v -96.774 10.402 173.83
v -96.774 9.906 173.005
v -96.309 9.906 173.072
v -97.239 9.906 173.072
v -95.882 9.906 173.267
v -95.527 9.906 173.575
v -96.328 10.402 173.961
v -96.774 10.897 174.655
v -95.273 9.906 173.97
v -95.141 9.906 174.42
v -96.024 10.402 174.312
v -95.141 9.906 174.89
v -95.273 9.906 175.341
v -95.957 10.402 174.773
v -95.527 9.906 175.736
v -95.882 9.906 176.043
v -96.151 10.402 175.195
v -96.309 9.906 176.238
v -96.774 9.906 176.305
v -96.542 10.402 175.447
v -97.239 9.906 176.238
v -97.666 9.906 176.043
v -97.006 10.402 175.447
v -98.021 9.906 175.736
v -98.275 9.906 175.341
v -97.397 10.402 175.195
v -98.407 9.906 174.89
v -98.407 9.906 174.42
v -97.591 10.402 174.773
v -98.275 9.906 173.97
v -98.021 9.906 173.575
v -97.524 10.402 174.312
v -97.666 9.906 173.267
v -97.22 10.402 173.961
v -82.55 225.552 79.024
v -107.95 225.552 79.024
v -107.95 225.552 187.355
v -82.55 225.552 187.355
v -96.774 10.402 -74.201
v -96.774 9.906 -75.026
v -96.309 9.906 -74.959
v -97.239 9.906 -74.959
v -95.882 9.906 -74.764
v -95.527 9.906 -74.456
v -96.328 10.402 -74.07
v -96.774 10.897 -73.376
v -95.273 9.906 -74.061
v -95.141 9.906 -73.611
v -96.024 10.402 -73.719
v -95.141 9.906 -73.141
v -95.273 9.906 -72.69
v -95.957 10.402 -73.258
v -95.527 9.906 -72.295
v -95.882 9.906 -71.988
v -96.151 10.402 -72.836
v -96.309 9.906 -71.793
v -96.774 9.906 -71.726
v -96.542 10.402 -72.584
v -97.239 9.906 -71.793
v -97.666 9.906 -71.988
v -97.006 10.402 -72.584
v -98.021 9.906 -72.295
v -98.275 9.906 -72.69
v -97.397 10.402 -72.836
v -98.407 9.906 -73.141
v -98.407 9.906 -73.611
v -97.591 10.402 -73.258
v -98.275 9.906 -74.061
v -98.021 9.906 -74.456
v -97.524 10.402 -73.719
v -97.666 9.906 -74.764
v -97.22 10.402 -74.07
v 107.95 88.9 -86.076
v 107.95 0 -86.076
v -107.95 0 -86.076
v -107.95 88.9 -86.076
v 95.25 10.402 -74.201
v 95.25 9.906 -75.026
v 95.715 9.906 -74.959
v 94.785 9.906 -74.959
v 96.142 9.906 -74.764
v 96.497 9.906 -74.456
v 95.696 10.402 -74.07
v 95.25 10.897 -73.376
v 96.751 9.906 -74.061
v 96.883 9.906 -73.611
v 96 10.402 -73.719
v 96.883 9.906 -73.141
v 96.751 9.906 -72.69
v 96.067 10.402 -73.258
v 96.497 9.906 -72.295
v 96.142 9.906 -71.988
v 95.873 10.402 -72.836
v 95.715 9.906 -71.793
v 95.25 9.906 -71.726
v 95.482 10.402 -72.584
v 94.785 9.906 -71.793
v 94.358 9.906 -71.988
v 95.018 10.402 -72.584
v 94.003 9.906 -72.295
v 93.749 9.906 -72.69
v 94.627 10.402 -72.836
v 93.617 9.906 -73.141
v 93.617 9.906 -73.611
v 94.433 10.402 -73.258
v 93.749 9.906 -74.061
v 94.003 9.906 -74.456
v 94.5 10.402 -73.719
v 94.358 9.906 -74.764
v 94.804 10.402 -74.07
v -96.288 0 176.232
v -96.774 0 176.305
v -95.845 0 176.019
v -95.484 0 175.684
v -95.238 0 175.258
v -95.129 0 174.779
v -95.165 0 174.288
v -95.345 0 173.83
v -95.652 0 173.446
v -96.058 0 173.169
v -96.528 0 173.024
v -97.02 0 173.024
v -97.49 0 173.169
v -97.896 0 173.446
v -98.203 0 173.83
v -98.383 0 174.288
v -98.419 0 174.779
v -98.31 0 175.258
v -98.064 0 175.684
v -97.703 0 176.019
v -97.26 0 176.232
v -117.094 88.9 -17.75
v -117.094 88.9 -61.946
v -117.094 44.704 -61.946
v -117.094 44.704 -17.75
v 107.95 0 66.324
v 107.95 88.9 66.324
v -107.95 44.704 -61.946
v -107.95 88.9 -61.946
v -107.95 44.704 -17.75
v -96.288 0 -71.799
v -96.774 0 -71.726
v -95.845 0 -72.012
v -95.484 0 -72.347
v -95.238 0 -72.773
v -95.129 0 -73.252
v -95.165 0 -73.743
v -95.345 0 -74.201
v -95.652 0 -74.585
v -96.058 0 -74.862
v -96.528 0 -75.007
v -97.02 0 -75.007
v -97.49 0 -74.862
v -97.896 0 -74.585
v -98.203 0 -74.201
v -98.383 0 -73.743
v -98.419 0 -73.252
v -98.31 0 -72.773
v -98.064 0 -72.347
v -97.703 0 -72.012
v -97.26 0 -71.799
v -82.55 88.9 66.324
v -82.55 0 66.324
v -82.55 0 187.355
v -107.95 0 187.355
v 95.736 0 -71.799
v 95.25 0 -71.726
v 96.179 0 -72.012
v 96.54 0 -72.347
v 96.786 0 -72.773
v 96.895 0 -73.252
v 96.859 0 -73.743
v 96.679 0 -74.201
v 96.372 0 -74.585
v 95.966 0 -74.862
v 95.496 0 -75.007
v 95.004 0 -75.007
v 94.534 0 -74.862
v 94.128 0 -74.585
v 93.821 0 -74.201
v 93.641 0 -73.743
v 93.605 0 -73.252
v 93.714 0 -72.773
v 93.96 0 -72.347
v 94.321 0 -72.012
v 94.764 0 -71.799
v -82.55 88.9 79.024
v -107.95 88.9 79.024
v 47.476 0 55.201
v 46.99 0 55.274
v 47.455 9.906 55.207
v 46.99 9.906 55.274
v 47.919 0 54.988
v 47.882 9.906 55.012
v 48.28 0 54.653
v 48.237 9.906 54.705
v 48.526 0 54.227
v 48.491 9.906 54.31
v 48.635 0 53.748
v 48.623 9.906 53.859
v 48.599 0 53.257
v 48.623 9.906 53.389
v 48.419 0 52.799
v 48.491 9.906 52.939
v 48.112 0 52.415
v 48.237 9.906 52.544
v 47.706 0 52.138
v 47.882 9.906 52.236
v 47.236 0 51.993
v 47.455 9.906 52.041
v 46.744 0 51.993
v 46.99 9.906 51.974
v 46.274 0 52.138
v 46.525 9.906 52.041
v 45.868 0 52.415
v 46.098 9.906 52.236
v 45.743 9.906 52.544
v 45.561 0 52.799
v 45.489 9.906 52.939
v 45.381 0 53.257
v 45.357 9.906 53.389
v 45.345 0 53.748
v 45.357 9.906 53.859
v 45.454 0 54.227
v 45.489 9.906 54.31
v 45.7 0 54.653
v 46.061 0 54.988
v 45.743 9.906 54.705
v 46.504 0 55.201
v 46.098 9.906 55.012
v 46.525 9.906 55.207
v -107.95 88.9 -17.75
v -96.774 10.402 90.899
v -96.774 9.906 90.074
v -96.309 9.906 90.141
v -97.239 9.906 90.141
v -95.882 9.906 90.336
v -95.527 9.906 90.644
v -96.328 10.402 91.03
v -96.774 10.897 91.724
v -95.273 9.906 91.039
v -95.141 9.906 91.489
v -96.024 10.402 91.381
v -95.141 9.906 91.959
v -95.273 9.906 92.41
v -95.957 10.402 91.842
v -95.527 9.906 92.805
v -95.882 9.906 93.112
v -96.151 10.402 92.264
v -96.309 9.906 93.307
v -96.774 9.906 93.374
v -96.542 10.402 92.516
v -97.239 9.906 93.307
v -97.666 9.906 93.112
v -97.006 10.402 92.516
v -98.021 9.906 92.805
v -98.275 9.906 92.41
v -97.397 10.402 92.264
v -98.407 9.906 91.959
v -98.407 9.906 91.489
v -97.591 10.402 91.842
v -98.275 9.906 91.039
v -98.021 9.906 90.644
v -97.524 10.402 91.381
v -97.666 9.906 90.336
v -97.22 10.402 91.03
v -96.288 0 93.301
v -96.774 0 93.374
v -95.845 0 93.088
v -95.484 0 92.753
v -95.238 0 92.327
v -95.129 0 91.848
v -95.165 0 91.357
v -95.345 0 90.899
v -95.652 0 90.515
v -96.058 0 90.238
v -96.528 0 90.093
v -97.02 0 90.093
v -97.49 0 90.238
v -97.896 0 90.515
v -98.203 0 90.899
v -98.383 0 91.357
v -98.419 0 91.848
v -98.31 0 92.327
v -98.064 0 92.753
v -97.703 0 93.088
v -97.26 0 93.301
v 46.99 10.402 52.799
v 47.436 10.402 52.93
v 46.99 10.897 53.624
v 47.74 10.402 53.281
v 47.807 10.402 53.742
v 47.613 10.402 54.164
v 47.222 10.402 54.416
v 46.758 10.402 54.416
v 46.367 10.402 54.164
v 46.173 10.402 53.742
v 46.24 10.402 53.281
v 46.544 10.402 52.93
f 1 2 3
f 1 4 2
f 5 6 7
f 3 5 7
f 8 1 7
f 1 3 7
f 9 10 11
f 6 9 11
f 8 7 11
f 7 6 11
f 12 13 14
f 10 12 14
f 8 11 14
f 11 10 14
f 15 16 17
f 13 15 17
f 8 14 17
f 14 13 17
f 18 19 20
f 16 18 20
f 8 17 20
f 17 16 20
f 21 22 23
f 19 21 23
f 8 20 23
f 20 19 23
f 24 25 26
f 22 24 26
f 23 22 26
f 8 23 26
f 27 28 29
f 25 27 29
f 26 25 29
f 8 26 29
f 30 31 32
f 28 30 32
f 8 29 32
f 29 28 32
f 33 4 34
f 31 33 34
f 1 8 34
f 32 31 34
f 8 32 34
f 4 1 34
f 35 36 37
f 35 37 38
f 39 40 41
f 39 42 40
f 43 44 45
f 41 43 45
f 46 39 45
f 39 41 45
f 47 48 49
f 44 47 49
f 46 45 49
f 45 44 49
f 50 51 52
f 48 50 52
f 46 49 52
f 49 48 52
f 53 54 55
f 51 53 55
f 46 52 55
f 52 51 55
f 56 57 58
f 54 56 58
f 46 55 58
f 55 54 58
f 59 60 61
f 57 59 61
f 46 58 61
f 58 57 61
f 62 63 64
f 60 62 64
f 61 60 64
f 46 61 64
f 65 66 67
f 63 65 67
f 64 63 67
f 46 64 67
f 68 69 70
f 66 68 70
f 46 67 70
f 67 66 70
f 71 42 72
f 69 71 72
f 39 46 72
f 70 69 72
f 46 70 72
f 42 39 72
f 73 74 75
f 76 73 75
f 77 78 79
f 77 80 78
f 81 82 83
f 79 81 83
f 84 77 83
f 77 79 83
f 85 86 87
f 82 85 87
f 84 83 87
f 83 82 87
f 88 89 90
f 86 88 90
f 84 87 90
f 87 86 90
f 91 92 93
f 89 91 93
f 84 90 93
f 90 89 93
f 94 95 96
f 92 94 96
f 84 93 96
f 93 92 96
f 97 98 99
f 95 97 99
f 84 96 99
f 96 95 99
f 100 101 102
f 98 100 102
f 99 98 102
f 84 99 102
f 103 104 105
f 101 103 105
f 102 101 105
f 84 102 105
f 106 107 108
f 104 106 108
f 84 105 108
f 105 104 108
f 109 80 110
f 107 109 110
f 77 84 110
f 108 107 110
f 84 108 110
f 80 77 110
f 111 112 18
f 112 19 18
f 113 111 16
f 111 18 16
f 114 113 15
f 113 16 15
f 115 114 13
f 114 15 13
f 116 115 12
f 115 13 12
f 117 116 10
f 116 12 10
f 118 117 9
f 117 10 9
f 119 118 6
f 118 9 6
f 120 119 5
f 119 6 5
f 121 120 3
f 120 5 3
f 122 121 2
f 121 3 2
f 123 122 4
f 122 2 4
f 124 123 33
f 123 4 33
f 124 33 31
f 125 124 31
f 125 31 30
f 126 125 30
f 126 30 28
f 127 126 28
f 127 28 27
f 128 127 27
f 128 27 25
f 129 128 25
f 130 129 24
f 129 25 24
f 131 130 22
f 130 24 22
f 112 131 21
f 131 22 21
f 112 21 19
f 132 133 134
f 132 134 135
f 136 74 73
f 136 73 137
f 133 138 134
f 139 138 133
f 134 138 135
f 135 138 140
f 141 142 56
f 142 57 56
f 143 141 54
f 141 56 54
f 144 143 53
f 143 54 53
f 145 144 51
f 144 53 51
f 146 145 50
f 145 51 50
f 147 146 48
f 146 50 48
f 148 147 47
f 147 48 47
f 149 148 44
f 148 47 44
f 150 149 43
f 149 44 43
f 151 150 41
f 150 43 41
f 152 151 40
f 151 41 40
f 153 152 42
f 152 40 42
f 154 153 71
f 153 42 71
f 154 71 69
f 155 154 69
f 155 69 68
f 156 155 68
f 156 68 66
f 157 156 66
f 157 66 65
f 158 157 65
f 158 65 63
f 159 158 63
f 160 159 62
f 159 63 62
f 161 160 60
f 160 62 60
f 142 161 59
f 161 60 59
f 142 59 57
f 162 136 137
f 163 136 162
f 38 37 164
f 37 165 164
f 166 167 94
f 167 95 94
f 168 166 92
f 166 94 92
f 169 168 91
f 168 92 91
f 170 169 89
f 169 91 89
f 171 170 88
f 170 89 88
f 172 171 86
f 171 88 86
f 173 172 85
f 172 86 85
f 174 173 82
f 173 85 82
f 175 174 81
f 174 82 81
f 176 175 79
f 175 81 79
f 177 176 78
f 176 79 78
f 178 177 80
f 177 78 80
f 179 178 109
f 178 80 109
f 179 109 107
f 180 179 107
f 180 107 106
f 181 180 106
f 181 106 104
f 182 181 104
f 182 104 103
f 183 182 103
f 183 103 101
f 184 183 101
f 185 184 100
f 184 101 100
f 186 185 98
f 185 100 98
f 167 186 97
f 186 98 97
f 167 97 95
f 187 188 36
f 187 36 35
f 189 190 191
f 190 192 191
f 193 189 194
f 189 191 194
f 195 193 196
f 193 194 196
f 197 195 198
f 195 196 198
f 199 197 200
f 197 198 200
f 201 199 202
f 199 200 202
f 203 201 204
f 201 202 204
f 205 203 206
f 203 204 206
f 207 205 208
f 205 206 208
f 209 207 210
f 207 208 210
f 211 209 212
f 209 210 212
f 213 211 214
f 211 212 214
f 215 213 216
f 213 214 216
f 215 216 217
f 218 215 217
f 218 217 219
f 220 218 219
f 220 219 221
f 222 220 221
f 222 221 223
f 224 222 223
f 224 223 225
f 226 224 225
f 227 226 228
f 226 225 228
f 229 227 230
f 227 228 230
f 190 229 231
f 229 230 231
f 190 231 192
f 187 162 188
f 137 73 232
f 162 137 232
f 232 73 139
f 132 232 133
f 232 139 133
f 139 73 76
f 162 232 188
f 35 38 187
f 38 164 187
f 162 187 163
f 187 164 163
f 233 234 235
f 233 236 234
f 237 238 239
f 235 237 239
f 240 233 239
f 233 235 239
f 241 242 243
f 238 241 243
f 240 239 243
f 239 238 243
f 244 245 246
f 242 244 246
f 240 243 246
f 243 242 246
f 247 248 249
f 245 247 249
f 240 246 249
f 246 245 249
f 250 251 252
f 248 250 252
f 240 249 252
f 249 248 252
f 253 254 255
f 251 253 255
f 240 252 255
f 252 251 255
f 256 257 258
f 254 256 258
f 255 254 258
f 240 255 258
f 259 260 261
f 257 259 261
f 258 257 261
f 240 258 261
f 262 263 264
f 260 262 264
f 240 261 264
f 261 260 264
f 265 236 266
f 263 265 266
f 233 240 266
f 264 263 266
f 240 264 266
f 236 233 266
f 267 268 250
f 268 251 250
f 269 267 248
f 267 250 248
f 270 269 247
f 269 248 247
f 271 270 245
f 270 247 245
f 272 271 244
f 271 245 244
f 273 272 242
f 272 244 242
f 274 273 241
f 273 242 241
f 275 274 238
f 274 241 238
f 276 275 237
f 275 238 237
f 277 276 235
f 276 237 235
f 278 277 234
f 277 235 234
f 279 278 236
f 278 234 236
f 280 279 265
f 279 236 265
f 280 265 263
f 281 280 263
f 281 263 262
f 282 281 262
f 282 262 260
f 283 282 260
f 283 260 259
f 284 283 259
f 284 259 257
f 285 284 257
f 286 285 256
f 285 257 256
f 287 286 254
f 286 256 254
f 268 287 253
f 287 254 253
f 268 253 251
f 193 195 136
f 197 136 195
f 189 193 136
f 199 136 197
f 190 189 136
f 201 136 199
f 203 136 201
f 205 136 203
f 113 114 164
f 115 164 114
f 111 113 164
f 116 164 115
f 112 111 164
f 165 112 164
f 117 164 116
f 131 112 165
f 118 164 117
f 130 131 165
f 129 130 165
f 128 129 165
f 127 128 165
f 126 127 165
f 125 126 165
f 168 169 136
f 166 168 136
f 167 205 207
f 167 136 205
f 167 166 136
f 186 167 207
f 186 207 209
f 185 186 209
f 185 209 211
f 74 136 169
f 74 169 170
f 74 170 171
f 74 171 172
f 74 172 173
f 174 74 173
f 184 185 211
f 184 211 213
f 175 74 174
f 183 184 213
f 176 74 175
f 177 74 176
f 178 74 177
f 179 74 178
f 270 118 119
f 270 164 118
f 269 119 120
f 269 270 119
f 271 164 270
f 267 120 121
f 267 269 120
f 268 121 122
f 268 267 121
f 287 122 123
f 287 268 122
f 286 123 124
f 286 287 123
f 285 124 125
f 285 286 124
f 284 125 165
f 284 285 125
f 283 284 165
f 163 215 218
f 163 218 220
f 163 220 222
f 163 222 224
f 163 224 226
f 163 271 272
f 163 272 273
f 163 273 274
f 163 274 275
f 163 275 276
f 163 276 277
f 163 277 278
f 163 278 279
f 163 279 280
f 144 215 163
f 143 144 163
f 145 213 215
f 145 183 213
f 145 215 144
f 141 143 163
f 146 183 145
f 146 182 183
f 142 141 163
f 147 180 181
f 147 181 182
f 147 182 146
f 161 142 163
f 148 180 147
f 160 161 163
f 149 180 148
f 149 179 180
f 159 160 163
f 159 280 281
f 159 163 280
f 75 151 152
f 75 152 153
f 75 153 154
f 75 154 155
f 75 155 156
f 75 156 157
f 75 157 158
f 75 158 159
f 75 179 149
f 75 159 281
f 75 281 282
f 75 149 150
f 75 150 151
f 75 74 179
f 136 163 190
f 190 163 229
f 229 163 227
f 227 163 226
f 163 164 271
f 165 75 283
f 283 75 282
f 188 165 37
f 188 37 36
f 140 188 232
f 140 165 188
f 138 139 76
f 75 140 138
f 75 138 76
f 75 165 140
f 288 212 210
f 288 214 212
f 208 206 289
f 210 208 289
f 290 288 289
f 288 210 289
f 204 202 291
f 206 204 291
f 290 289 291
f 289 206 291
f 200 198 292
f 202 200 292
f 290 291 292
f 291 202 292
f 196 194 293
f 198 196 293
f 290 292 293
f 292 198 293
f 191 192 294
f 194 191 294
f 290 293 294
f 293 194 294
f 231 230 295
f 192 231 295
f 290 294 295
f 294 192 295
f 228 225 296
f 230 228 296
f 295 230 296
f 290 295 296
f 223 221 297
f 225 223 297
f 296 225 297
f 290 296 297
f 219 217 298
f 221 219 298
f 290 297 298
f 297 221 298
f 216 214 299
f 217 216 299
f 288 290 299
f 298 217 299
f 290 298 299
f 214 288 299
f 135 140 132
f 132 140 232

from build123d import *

# Parameters (mm, degrees)
BOSS_EXTRUDE2_DEPTH       = 88.9
SKETCH2_W                 = 25.4
SKETCH2_H                 = 108.331
BOSS_EXTRUDE3_DEPTH       = 136.652
M4X0_7_TAPPED_HOLE2_D     = 3.3
M4X0_7_TAPPED_HOLE2_DEPTH = 9.906
M4X0_7_TAPPED_HOLE2_TIP   = 0.991420021
SKETCH5_W                 = 44.196
SKETCH5_H                 = 44.196
BOSS_EXTRUDE4_DEPTH       = 9.144


with BuildPart() as part:
    # Sketch1 → Boss-Extrude2 (new body)
    with BuildSketch(Plane(origin=(0, 0, 0), x_dir=(1, 0, 0), z_dir=(0, 1, 0))):
        Polygon((-82.55, 86.075791262), (107.95, 86.075791262), (107.95, -66.324208738), (-82.55, -66.324208738), (-82.55, -187.355208738), (-107.95, -187.355208738), (-107.95, 86.075791262), align=None)
    extrude(amount=BOSS_EXTRUDE2_DEPTH)

    # Sketch2 → Boss-Extrude3 (add)
    with BuildSketch(Plane(origin=(0, 88.9, 0), x_dir=(1, 0, 0), z_dir=(0, 1, 0))):
        with Locations((-95.25, -133.189708738)):
            Rectangle(SKETCH2_W, SKETCH2_H)
    extrude(amount=BOSS_EXTRUDE3_DEPTH)

    # M4x0.7 Tapped Hole2
    with Locations(Plane(origin=(95.25, 0, -73.375791262), x_dir=(0, 0, -1), z_dir=(0, -1, 0))):
        with Locations((0, 0), (0, -192.024), (-127, -48.26), (-248.031, -192.024), (-165.1, -192.024)):
            Hole(M4X0_7_TAPPED_HOLE2_D / 2, depth=M4X0_7_TAPPED_HOLE2_DEPTH)
            with Locations((0, 0, -(M4X0_7_TAPPED_HOLE2_DEPTH + M4X0_7_TAPPED_HOLE2_TIP / 2))):  # 118° drill point
                Cone(0, M4X0_7_TAPPED_HOLE2_D / 2, M4X0_7_TAPPED_HOLE2_TIP, mode=Mode.SUBTRACT)

    # Sketch5 → Boss-Extrude4 (add)
    with BuildSketch(Plane.ZY.offset(107.95)):
        with Locations((-39.847791262, 66.802)):
            Rectangle(SKETCH5_W, SKETCH5_H)
    extrude(amount=BOSS_EXTRUDE4_DEPTH)


solid = part.part
